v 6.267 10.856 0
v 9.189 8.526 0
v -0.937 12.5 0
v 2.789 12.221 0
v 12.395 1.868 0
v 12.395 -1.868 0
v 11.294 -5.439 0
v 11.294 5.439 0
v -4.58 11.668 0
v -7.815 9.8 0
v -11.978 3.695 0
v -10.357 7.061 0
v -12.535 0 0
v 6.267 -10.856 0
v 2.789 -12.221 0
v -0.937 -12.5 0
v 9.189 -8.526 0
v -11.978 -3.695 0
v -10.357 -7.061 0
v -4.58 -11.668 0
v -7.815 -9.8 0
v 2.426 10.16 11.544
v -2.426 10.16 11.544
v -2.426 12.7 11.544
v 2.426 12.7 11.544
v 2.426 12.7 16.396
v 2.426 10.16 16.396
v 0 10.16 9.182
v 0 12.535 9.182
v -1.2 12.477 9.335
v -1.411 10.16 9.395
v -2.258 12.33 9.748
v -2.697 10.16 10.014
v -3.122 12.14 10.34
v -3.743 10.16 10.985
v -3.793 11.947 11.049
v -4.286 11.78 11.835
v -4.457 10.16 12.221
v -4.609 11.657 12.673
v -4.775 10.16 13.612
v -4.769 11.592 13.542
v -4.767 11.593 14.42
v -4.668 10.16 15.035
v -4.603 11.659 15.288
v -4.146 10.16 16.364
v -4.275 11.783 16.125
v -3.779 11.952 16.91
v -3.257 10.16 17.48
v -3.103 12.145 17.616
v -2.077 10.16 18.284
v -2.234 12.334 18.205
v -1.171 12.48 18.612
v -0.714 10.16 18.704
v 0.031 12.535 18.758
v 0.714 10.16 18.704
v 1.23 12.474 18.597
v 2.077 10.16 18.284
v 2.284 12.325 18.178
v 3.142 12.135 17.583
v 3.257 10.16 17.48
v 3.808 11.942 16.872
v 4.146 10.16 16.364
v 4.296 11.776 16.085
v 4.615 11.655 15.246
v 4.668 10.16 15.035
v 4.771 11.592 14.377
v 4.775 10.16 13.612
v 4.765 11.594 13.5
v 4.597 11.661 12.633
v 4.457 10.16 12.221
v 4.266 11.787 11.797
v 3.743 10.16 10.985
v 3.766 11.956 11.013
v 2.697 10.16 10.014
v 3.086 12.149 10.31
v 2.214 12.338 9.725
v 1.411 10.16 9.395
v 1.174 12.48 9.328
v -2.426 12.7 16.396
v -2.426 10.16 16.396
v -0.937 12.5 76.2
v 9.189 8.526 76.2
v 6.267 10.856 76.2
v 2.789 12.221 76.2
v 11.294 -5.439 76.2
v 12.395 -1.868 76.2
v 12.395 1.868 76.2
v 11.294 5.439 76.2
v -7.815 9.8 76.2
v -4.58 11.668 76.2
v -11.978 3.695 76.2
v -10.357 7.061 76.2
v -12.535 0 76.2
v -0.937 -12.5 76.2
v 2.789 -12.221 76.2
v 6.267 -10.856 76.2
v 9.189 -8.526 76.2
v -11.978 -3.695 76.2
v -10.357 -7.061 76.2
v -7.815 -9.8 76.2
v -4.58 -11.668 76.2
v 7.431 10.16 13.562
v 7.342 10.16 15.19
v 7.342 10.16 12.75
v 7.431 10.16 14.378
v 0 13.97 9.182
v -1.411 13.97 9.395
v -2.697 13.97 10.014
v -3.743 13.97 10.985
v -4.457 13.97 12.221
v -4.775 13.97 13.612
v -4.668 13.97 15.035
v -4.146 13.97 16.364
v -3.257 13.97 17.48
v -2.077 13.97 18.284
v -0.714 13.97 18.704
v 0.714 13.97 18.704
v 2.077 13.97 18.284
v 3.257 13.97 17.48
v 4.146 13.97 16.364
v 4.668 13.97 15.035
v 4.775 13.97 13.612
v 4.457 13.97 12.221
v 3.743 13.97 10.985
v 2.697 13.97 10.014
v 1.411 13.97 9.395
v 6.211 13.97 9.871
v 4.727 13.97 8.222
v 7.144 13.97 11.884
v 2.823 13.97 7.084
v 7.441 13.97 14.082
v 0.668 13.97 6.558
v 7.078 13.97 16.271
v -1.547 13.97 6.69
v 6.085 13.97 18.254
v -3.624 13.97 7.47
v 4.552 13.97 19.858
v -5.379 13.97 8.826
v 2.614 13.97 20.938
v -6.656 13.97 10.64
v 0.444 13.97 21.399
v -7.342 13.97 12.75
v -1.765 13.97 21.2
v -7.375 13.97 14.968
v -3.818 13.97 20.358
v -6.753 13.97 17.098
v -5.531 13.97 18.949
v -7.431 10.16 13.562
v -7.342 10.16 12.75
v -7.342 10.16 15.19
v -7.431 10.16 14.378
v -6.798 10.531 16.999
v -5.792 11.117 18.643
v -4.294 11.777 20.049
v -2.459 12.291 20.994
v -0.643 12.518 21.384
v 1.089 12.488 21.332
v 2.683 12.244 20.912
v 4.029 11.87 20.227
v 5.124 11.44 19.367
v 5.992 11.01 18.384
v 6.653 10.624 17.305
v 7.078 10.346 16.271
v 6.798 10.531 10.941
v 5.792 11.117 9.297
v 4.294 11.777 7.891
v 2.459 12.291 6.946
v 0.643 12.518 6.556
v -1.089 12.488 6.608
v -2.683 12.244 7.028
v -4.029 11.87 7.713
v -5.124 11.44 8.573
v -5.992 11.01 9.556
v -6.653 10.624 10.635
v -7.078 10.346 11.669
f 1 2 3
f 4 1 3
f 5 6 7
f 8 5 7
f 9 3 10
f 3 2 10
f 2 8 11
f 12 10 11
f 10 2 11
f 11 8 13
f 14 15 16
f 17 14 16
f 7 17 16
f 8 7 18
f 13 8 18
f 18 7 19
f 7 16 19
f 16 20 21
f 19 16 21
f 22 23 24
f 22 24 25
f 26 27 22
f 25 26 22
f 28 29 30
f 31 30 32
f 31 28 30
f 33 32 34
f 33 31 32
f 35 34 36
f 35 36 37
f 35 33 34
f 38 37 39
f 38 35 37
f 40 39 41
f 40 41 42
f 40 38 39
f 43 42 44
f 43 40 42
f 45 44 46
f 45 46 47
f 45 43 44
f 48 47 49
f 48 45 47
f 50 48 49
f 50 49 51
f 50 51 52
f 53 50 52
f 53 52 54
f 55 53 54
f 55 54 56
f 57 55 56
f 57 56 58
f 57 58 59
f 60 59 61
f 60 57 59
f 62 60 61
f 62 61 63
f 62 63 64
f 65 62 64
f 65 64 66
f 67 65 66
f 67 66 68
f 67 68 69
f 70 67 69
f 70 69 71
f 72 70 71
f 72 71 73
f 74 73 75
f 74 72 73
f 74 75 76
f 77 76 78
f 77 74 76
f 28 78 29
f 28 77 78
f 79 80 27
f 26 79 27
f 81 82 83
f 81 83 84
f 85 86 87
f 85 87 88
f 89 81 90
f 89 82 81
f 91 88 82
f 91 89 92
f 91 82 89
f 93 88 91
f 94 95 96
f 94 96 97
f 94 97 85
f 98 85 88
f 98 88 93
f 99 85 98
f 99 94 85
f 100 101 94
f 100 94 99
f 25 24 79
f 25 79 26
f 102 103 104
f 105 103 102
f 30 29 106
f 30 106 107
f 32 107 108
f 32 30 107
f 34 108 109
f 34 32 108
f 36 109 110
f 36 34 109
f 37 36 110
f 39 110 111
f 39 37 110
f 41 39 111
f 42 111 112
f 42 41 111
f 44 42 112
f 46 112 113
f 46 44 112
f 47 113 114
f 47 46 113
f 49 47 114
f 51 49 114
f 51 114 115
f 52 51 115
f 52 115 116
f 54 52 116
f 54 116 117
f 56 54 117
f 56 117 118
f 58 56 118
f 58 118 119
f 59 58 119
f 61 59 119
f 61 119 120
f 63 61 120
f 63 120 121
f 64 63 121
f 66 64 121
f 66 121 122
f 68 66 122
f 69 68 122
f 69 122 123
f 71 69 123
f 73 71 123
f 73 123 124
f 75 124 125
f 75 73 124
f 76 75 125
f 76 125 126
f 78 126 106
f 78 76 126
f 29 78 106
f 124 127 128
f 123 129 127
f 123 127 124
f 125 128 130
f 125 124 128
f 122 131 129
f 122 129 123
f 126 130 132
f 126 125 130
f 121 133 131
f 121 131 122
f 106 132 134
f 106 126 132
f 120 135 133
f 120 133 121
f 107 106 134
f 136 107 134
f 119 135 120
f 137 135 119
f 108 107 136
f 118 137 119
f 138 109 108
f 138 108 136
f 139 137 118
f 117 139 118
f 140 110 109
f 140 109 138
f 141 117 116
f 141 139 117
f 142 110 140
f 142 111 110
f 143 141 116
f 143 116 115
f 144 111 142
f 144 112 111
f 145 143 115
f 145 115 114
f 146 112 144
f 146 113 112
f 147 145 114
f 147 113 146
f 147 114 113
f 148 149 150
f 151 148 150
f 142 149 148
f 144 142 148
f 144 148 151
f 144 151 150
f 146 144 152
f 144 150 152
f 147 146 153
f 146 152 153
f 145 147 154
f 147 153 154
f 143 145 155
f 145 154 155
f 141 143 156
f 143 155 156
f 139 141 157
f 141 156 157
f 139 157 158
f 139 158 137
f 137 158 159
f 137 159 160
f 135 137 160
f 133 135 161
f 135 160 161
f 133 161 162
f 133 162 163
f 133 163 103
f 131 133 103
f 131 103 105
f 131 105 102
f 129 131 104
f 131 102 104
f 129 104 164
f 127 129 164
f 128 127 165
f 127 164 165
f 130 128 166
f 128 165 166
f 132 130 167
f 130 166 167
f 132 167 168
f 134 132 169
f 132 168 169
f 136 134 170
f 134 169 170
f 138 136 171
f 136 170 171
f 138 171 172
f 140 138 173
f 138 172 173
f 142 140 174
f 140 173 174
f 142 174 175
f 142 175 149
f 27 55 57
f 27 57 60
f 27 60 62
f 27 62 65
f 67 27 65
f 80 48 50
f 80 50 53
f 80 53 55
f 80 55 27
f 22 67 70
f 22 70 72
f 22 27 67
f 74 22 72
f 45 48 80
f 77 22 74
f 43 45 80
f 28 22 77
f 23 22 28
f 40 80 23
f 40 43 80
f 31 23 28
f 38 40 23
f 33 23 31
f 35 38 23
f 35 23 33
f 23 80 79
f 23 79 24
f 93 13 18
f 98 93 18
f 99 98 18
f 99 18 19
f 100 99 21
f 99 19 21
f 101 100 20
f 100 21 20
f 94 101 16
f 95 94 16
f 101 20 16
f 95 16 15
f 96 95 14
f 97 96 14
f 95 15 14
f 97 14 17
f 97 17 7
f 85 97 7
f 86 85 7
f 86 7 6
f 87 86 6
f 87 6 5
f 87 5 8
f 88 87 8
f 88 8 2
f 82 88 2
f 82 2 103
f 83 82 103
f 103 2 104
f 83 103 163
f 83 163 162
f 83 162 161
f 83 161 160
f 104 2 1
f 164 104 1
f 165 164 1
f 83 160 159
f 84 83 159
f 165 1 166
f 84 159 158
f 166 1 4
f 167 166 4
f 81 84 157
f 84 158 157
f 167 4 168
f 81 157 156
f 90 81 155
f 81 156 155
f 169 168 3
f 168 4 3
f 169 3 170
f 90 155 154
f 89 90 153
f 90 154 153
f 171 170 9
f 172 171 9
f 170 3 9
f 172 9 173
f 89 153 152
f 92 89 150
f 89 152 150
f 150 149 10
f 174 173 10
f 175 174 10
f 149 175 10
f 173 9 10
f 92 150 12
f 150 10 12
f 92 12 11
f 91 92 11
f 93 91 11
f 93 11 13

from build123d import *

# Parameters (mm, degrees)
SKETCH1_R           = 12.5349
BOSS_EXTRUDE1_DEPTH = 76.2
SKETCH2_R           = 4.7879
CUT_EXTRUDE1_DEPTH  = 76.2
SKETCH3_W           = 4.8514
SKETCH3_H           = 4.8514
BOSS_EXTRUDE2_DEPTH = 2.54
SKETCH4_R           = 7.4422
SKETCH4_R_2         = 4.7879
BOSS_EXTRUDE3_DEPTH = 3.81


with BuildPart() as part:
    # Sketch1 → Boss-Extrude1 (new body)
    with BuildSketch(Plane.XY):
        with Locations(Location((0, 0, 0), (0, 0, 180))):
            Circle(SKETCH1_R)
    extrude(amount=BOSS_EXTRUDE1_DEPTH)

    # Sketch2 → Cut-Extrude1 (cut)
    with BuildSketch(Plane(origin=(0, 10.16, 0), x_dir=(1, 0, 0), z_dir=(0, 1, 0))):
        with Locations(Location((0, -13.97, 0), (0, 0, 90))):
            Circle(SKETCH2_R)
    extrude(amount=CUT_EXTRUDE1_DEPTH, mode=Mode.SUBTRACT)

    # Sketch3 → Boss-Extrude2 (add)
    with BuildSketch(Plane(origin=(0, 10.16, 0), x_dir=(1, 0, 0), z_dir=(0, 1, 0))):
        with Locations((0, -13.97)):
            Rectangle(SKETCH3_W, SKETCH3_H)
    extrude(amount=BOSS_EXTRUDE2_DEPTH)

    # Sketch4 → Boss-Extrude3 (add)
    with BuildSketch(Plane(origin=(0, 10.16, 0), x_dir=(1, 0, 0), z_dir=(0, 1, 0))):
        with Locations(Location((0, -13.97, 0), (0, 0, 170.565483852))):
            Circle(SKETCH4_R)
        with Locations(Location((0, -13.97, 0), (0, 0, 90))):
            Circle(SKETCH4_R_2, mode=Mode.SUBTRACT)
    extrude(amount=BOSS_EXTRUDE3_DEPTH)


solid = part.part
